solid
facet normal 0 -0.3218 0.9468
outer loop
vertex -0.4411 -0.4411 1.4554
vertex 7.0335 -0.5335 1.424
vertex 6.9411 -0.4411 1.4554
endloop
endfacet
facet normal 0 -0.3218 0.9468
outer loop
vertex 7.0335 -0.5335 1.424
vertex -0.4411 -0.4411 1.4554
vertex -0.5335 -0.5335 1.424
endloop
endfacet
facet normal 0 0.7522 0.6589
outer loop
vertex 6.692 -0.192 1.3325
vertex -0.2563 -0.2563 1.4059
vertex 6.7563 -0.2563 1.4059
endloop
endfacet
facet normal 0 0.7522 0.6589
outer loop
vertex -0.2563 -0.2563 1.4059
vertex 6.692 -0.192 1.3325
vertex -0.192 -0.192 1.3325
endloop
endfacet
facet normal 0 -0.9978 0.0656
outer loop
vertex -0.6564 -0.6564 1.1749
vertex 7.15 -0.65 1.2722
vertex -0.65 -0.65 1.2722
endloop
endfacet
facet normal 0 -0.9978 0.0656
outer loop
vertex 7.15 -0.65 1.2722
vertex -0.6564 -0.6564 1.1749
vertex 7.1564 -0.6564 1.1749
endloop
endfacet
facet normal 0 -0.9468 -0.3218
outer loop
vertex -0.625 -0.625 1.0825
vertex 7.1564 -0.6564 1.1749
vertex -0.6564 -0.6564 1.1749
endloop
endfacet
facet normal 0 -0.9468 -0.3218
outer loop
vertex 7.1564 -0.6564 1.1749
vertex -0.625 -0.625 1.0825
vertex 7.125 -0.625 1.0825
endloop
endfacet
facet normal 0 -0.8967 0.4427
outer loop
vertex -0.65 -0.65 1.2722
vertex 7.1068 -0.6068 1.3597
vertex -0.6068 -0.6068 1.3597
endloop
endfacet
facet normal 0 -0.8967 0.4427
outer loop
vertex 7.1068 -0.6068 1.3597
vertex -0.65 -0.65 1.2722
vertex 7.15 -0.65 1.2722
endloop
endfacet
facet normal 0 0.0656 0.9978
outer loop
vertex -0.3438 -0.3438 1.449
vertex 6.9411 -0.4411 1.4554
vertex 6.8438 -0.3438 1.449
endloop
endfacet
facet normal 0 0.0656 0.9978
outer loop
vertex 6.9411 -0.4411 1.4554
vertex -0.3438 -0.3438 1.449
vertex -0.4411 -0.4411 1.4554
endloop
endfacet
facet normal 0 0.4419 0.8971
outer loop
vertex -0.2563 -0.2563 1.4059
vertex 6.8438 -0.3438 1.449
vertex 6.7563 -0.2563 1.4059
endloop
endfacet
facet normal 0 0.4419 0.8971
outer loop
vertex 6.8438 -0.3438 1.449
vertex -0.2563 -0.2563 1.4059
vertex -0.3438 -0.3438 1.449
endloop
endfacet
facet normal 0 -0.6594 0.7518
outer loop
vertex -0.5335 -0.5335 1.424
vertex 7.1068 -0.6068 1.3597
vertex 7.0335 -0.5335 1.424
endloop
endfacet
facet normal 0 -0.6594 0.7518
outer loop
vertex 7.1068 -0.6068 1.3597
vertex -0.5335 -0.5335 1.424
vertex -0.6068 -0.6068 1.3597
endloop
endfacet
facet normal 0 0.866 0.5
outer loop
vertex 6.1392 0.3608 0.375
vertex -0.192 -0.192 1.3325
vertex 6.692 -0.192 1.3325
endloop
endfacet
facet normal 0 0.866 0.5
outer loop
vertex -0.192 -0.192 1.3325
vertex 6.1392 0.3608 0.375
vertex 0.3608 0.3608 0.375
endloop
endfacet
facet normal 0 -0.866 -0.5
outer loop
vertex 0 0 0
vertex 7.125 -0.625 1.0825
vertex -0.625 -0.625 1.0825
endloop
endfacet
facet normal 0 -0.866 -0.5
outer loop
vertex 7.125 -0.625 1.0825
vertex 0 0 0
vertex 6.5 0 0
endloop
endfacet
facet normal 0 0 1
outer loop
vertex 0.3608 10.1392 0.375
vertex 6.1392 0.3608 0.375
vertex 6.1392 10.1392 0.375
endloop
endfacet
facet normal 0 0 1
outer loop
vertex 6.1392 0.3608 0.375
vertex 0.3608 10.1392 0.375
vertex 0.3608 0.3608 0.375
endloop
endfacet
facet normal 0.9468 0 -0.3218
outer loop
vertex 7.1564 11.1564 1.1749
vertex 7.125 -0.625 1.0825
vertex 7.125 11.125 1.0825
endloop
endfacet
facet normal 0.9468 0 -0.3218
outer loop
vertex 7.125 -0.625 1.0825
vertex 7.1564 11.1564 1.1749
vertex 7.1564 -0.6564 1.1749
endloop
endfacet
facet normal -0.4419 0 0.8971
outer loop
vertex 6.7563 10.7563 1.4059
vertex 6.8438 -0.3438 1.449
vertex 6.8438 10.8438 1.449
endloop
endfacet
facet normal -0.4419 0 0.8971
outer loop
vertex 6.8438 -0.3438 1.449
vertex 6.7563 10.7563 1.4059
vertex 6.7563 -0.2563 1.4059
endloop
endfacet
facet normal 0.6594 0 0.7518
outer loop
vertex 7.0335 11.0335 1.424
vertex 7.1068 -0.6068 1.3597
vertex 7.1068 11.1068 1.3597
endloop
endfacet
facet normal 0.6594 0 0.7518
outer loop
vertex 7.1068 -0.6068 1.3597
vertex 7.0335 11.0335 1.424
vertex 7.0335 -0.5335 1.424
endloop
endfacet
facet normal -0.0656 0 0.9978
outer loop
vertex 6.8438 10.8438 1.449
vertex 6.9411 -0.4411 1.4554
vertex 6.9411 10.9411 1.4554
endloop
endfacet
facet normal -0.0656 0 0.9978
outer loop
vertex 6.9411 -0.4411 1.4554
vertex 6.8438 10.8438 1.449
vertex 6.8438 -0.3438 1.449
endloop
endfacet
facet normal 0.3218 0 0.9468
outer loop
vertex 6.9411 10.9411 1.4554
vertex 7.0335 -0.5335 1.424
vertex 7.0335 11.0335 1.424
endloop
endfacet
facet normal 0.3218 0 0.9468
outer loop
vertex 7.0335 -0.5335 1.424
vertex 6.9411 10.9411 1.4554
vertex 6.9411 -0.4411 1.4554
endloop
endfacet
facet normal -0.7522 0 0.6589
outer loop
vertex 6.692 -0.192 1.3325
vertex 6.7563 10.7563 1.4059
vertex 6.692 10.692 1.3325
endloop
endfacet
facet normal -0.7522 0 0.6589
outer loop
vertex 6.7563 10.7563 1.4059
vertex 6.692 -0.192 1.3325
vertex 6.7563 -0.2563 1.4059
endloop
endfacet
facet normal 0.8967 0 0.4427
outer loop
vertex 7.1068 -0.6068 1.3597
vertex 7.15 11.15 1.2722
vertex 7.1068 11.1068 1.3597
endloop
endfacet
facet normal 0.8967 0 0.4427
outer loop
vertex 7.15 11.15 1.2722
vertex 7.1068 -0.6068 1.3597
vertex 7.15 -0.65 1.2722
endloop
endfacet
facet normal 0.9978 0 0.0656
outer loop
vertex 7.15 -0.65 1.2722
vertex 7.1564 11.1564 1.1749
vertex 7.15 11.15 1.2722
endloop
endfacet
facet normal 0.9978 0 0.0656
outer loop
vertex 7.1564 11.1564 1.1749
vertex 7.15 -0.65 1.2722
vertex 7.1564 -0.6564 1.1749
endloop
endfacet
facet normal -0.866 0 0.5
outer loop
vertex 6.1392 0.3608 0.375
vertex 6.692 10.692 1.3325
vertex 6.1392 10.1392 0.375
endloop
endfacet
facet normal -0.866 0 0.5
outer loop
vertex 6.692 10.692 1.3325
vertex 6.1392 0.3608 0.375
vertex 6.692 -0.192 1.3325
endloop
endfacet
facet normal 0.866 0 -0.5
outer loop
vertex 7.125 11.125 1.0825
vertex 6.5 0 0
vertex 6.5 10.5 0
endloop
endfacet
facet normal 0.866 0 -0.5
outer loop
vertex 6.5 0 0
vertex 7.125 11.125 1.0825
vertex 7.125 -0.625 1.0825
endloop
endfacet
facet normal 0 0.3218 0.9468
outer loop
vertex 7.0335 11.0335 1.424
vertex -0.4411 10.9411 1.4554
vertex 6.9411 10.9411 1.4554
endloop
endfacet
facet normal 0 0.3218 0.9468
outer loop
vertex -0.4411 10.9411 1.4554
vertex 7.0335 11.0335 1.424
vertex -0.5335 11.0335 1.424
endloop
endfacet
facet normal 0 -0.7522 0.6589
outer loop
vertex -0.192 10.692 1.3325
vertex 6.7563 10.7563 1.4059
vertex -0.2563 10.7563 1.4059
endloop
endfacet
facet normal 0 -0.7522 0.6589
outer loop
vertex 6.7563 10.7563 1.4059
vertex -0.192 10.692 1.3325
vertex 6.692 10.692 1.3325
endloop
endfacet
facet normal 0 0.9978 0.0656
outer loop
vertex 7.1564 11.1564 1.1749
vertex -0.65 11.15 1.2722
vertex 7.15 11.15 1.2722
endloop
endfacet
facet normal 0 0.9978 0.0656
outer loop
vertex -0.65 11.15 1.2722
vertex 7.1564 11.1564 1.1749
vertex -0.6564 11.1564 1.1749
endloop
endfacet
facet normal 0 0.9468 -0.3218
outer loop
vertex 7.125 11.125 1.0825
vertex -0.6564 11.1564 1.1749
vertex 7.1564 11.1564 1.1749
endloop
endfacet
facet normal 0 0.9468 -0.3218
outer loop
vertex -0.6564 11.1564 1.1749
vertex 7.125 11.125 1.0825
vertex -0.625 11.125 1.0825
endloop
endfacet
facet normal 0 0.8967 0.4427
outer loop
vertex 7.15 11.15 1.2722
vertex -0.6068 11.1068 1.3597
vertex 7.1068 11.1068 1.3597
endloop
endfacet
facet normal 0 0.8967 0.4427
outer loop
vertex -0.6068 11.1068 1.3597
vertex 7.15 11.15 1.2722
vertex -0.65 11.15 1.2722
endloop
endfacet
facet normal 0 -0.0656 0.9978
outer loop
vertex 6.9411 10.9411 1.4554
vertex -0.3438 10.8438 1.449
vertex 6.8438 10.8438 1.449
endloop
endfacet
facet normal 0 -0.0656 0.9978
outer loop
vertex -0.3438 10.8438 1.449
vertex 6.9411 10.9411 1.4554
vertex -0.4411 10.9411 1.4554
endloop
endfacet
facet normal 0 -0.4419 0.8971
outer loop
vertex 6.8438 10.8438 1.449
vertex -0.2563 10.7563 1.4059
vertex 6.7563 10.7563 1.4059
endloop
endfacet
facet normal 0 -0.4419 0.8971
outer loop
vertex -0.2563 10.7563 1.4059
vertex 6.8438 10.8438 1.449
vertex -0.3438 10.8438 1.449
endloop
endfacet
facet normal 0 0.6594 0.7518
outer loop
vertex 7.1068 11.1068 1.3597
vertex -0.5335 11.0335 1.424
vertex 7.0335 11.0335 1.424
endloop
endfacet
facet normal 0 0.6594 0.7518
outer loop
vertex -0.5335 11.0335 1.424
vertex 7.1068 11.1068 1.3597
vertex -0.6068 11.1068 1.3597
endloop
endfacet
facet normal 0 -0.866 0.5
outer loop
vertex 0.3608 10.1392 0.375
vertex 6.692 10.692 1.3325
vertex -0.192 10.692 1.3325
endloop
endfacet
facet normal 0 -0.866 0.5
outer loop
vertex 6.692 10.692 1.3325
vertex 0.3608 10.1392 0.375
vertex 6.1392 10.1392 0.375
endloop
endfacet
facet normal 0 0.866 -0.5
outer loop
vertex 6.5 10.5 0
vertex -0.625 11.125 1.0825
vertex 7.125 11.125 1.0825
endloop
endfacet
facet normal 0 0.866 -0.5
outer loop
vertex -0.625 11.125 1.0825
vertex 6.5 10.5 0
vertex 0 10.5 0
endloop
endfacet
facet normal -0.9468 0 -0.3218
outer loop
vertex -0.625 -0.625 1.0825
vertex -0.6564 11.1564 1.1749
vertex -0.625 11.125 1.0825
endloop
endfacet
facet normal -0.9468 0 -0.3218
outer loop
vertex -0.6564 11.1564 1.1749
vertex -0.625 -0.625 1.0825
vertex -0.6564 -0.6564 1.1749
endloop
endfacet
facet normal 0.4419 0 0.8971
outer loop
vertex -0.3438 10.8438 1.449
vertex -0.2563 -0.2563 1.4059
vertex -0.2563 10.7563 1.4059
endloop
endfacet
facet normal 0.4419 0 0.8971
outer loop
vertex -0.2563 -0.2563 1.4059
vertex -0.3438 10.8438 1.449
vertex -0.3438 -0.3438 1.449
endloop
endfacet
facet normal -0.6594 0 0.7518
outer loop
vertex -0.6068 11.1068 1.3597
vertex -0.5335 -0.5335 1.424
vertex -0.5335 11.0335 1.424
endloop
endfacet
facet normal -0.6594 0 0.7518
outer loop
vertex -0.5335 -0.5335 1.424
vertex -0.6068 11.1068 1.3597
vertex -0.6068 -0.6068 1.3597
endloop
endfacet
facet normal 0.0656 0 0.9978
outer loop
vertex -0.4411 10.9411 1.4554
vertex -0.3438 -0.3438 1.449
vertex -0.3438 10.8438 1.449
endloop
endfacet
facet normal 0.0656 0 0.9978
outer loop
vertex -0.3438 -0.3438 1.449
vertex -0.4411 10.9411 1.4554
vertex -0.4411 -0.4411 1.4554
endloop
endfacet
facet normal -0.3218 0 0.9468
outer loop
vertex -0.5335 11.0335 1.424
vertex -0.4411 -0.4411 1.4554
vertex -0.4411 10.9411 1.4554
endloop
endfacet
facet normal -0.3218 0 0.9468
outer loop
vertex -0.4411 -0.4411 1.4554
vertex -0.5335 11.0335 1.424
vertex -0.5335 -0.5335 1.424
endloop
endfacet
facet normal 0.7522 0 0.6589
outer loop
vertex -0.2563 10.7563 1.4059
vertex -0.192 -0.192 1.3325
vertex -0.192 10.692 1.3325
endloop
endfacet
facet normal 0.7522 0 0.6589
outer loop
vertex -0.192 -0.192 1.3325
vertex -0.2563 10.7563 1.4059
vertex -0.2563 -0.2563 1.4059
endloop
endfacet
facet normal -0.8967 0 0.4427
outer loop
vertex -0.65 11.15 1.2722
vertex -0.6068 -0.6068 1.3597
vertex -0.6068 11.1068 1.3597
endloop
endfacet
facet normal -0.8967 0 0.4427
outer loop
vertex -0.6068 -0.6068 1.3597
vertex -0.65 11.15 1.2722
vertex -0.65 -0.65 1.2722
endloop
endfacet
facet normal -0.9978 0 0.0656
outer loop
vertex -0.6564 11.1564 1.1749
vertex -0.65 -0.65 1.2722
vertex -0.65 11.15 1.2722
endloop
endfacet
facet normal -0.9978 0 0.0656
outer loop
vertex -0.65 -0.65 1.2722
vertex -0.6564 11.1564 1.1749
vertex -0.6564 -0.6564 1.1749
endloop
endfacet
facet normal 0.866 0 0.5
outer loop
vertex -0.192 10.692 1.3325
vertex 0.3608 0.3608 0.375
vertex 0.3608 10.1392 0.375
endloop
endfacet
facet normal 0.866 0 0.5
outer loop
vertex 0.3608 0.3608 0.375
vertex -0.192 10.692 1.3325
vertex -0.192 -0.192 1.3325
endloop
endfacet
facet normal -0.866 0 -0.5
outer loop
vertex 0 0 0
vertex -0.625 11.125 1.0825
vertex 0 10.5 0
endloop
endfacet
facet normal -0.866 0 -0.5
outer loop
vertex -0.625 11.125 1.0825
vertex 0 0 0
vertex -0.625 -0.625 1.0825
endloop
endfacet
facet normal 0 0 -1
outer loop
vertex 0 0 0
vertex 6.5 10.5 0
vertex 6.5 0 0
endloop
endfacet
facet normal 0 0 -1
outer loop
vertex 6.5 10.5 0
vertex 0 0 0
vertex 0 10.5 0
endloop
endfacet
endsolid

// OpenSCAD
base_width = 6.5;
golden_ratio = (1 + sqrt(5)) / 2;
base_length = round(4 * base_width * golden_ratio) / 4; // Closest quarter inch.
base_thickness = 3/8;

echo(base_length);
echo(base_width);
color("gold")
//translate([0, 0, 1/2 * sin(60) - base_thickness])
cube([base_width, base_length, base_thickness]);

module edge(length)
{
    board_thickness = 1/2;
    board_height = 1.5;
    top_angle = 30;
    difference()
    {
        // mitred edge.
        intersection()
        {
            // edge piece.
            rotate([top_angle, 0, 0])
                translate([-board_height, 0, 0])
                    union()
                    {
                        translate([0, board_thickness/2, board_height - board_thickness/2])
                            rotate([0, 90, 0])
                                cylinder(h = length + board_height * 2, r = board_thickness/2, $fn=16);
                        cube([length + board_height * 2, board_thickness, board_height - board_thickness/2]);
                    }
                    
            // mitre
            translate([length /2, length / 2, 0])
                rotate([0, 0, -135])
                    cube([length * 4, length * 4, board_height * 4], center = false);
        }
        
        // base groove
        cube([length + board_height * 2, board_thickness, base_thickness]);
    }
}

color("brown")
edge(base_width);
color("brown")
translate([base_width, 0, 0])
    rotate([0, 0, 90])
        edge(base_length);
color("brown")
translate([base_width, base_length, 0])
    rotate([0, 0, 180])
        edge(base_width);
color("brown")
translate([0, base_length, 0])
    rotate([0, 0, 270])
        edge(base_length);
